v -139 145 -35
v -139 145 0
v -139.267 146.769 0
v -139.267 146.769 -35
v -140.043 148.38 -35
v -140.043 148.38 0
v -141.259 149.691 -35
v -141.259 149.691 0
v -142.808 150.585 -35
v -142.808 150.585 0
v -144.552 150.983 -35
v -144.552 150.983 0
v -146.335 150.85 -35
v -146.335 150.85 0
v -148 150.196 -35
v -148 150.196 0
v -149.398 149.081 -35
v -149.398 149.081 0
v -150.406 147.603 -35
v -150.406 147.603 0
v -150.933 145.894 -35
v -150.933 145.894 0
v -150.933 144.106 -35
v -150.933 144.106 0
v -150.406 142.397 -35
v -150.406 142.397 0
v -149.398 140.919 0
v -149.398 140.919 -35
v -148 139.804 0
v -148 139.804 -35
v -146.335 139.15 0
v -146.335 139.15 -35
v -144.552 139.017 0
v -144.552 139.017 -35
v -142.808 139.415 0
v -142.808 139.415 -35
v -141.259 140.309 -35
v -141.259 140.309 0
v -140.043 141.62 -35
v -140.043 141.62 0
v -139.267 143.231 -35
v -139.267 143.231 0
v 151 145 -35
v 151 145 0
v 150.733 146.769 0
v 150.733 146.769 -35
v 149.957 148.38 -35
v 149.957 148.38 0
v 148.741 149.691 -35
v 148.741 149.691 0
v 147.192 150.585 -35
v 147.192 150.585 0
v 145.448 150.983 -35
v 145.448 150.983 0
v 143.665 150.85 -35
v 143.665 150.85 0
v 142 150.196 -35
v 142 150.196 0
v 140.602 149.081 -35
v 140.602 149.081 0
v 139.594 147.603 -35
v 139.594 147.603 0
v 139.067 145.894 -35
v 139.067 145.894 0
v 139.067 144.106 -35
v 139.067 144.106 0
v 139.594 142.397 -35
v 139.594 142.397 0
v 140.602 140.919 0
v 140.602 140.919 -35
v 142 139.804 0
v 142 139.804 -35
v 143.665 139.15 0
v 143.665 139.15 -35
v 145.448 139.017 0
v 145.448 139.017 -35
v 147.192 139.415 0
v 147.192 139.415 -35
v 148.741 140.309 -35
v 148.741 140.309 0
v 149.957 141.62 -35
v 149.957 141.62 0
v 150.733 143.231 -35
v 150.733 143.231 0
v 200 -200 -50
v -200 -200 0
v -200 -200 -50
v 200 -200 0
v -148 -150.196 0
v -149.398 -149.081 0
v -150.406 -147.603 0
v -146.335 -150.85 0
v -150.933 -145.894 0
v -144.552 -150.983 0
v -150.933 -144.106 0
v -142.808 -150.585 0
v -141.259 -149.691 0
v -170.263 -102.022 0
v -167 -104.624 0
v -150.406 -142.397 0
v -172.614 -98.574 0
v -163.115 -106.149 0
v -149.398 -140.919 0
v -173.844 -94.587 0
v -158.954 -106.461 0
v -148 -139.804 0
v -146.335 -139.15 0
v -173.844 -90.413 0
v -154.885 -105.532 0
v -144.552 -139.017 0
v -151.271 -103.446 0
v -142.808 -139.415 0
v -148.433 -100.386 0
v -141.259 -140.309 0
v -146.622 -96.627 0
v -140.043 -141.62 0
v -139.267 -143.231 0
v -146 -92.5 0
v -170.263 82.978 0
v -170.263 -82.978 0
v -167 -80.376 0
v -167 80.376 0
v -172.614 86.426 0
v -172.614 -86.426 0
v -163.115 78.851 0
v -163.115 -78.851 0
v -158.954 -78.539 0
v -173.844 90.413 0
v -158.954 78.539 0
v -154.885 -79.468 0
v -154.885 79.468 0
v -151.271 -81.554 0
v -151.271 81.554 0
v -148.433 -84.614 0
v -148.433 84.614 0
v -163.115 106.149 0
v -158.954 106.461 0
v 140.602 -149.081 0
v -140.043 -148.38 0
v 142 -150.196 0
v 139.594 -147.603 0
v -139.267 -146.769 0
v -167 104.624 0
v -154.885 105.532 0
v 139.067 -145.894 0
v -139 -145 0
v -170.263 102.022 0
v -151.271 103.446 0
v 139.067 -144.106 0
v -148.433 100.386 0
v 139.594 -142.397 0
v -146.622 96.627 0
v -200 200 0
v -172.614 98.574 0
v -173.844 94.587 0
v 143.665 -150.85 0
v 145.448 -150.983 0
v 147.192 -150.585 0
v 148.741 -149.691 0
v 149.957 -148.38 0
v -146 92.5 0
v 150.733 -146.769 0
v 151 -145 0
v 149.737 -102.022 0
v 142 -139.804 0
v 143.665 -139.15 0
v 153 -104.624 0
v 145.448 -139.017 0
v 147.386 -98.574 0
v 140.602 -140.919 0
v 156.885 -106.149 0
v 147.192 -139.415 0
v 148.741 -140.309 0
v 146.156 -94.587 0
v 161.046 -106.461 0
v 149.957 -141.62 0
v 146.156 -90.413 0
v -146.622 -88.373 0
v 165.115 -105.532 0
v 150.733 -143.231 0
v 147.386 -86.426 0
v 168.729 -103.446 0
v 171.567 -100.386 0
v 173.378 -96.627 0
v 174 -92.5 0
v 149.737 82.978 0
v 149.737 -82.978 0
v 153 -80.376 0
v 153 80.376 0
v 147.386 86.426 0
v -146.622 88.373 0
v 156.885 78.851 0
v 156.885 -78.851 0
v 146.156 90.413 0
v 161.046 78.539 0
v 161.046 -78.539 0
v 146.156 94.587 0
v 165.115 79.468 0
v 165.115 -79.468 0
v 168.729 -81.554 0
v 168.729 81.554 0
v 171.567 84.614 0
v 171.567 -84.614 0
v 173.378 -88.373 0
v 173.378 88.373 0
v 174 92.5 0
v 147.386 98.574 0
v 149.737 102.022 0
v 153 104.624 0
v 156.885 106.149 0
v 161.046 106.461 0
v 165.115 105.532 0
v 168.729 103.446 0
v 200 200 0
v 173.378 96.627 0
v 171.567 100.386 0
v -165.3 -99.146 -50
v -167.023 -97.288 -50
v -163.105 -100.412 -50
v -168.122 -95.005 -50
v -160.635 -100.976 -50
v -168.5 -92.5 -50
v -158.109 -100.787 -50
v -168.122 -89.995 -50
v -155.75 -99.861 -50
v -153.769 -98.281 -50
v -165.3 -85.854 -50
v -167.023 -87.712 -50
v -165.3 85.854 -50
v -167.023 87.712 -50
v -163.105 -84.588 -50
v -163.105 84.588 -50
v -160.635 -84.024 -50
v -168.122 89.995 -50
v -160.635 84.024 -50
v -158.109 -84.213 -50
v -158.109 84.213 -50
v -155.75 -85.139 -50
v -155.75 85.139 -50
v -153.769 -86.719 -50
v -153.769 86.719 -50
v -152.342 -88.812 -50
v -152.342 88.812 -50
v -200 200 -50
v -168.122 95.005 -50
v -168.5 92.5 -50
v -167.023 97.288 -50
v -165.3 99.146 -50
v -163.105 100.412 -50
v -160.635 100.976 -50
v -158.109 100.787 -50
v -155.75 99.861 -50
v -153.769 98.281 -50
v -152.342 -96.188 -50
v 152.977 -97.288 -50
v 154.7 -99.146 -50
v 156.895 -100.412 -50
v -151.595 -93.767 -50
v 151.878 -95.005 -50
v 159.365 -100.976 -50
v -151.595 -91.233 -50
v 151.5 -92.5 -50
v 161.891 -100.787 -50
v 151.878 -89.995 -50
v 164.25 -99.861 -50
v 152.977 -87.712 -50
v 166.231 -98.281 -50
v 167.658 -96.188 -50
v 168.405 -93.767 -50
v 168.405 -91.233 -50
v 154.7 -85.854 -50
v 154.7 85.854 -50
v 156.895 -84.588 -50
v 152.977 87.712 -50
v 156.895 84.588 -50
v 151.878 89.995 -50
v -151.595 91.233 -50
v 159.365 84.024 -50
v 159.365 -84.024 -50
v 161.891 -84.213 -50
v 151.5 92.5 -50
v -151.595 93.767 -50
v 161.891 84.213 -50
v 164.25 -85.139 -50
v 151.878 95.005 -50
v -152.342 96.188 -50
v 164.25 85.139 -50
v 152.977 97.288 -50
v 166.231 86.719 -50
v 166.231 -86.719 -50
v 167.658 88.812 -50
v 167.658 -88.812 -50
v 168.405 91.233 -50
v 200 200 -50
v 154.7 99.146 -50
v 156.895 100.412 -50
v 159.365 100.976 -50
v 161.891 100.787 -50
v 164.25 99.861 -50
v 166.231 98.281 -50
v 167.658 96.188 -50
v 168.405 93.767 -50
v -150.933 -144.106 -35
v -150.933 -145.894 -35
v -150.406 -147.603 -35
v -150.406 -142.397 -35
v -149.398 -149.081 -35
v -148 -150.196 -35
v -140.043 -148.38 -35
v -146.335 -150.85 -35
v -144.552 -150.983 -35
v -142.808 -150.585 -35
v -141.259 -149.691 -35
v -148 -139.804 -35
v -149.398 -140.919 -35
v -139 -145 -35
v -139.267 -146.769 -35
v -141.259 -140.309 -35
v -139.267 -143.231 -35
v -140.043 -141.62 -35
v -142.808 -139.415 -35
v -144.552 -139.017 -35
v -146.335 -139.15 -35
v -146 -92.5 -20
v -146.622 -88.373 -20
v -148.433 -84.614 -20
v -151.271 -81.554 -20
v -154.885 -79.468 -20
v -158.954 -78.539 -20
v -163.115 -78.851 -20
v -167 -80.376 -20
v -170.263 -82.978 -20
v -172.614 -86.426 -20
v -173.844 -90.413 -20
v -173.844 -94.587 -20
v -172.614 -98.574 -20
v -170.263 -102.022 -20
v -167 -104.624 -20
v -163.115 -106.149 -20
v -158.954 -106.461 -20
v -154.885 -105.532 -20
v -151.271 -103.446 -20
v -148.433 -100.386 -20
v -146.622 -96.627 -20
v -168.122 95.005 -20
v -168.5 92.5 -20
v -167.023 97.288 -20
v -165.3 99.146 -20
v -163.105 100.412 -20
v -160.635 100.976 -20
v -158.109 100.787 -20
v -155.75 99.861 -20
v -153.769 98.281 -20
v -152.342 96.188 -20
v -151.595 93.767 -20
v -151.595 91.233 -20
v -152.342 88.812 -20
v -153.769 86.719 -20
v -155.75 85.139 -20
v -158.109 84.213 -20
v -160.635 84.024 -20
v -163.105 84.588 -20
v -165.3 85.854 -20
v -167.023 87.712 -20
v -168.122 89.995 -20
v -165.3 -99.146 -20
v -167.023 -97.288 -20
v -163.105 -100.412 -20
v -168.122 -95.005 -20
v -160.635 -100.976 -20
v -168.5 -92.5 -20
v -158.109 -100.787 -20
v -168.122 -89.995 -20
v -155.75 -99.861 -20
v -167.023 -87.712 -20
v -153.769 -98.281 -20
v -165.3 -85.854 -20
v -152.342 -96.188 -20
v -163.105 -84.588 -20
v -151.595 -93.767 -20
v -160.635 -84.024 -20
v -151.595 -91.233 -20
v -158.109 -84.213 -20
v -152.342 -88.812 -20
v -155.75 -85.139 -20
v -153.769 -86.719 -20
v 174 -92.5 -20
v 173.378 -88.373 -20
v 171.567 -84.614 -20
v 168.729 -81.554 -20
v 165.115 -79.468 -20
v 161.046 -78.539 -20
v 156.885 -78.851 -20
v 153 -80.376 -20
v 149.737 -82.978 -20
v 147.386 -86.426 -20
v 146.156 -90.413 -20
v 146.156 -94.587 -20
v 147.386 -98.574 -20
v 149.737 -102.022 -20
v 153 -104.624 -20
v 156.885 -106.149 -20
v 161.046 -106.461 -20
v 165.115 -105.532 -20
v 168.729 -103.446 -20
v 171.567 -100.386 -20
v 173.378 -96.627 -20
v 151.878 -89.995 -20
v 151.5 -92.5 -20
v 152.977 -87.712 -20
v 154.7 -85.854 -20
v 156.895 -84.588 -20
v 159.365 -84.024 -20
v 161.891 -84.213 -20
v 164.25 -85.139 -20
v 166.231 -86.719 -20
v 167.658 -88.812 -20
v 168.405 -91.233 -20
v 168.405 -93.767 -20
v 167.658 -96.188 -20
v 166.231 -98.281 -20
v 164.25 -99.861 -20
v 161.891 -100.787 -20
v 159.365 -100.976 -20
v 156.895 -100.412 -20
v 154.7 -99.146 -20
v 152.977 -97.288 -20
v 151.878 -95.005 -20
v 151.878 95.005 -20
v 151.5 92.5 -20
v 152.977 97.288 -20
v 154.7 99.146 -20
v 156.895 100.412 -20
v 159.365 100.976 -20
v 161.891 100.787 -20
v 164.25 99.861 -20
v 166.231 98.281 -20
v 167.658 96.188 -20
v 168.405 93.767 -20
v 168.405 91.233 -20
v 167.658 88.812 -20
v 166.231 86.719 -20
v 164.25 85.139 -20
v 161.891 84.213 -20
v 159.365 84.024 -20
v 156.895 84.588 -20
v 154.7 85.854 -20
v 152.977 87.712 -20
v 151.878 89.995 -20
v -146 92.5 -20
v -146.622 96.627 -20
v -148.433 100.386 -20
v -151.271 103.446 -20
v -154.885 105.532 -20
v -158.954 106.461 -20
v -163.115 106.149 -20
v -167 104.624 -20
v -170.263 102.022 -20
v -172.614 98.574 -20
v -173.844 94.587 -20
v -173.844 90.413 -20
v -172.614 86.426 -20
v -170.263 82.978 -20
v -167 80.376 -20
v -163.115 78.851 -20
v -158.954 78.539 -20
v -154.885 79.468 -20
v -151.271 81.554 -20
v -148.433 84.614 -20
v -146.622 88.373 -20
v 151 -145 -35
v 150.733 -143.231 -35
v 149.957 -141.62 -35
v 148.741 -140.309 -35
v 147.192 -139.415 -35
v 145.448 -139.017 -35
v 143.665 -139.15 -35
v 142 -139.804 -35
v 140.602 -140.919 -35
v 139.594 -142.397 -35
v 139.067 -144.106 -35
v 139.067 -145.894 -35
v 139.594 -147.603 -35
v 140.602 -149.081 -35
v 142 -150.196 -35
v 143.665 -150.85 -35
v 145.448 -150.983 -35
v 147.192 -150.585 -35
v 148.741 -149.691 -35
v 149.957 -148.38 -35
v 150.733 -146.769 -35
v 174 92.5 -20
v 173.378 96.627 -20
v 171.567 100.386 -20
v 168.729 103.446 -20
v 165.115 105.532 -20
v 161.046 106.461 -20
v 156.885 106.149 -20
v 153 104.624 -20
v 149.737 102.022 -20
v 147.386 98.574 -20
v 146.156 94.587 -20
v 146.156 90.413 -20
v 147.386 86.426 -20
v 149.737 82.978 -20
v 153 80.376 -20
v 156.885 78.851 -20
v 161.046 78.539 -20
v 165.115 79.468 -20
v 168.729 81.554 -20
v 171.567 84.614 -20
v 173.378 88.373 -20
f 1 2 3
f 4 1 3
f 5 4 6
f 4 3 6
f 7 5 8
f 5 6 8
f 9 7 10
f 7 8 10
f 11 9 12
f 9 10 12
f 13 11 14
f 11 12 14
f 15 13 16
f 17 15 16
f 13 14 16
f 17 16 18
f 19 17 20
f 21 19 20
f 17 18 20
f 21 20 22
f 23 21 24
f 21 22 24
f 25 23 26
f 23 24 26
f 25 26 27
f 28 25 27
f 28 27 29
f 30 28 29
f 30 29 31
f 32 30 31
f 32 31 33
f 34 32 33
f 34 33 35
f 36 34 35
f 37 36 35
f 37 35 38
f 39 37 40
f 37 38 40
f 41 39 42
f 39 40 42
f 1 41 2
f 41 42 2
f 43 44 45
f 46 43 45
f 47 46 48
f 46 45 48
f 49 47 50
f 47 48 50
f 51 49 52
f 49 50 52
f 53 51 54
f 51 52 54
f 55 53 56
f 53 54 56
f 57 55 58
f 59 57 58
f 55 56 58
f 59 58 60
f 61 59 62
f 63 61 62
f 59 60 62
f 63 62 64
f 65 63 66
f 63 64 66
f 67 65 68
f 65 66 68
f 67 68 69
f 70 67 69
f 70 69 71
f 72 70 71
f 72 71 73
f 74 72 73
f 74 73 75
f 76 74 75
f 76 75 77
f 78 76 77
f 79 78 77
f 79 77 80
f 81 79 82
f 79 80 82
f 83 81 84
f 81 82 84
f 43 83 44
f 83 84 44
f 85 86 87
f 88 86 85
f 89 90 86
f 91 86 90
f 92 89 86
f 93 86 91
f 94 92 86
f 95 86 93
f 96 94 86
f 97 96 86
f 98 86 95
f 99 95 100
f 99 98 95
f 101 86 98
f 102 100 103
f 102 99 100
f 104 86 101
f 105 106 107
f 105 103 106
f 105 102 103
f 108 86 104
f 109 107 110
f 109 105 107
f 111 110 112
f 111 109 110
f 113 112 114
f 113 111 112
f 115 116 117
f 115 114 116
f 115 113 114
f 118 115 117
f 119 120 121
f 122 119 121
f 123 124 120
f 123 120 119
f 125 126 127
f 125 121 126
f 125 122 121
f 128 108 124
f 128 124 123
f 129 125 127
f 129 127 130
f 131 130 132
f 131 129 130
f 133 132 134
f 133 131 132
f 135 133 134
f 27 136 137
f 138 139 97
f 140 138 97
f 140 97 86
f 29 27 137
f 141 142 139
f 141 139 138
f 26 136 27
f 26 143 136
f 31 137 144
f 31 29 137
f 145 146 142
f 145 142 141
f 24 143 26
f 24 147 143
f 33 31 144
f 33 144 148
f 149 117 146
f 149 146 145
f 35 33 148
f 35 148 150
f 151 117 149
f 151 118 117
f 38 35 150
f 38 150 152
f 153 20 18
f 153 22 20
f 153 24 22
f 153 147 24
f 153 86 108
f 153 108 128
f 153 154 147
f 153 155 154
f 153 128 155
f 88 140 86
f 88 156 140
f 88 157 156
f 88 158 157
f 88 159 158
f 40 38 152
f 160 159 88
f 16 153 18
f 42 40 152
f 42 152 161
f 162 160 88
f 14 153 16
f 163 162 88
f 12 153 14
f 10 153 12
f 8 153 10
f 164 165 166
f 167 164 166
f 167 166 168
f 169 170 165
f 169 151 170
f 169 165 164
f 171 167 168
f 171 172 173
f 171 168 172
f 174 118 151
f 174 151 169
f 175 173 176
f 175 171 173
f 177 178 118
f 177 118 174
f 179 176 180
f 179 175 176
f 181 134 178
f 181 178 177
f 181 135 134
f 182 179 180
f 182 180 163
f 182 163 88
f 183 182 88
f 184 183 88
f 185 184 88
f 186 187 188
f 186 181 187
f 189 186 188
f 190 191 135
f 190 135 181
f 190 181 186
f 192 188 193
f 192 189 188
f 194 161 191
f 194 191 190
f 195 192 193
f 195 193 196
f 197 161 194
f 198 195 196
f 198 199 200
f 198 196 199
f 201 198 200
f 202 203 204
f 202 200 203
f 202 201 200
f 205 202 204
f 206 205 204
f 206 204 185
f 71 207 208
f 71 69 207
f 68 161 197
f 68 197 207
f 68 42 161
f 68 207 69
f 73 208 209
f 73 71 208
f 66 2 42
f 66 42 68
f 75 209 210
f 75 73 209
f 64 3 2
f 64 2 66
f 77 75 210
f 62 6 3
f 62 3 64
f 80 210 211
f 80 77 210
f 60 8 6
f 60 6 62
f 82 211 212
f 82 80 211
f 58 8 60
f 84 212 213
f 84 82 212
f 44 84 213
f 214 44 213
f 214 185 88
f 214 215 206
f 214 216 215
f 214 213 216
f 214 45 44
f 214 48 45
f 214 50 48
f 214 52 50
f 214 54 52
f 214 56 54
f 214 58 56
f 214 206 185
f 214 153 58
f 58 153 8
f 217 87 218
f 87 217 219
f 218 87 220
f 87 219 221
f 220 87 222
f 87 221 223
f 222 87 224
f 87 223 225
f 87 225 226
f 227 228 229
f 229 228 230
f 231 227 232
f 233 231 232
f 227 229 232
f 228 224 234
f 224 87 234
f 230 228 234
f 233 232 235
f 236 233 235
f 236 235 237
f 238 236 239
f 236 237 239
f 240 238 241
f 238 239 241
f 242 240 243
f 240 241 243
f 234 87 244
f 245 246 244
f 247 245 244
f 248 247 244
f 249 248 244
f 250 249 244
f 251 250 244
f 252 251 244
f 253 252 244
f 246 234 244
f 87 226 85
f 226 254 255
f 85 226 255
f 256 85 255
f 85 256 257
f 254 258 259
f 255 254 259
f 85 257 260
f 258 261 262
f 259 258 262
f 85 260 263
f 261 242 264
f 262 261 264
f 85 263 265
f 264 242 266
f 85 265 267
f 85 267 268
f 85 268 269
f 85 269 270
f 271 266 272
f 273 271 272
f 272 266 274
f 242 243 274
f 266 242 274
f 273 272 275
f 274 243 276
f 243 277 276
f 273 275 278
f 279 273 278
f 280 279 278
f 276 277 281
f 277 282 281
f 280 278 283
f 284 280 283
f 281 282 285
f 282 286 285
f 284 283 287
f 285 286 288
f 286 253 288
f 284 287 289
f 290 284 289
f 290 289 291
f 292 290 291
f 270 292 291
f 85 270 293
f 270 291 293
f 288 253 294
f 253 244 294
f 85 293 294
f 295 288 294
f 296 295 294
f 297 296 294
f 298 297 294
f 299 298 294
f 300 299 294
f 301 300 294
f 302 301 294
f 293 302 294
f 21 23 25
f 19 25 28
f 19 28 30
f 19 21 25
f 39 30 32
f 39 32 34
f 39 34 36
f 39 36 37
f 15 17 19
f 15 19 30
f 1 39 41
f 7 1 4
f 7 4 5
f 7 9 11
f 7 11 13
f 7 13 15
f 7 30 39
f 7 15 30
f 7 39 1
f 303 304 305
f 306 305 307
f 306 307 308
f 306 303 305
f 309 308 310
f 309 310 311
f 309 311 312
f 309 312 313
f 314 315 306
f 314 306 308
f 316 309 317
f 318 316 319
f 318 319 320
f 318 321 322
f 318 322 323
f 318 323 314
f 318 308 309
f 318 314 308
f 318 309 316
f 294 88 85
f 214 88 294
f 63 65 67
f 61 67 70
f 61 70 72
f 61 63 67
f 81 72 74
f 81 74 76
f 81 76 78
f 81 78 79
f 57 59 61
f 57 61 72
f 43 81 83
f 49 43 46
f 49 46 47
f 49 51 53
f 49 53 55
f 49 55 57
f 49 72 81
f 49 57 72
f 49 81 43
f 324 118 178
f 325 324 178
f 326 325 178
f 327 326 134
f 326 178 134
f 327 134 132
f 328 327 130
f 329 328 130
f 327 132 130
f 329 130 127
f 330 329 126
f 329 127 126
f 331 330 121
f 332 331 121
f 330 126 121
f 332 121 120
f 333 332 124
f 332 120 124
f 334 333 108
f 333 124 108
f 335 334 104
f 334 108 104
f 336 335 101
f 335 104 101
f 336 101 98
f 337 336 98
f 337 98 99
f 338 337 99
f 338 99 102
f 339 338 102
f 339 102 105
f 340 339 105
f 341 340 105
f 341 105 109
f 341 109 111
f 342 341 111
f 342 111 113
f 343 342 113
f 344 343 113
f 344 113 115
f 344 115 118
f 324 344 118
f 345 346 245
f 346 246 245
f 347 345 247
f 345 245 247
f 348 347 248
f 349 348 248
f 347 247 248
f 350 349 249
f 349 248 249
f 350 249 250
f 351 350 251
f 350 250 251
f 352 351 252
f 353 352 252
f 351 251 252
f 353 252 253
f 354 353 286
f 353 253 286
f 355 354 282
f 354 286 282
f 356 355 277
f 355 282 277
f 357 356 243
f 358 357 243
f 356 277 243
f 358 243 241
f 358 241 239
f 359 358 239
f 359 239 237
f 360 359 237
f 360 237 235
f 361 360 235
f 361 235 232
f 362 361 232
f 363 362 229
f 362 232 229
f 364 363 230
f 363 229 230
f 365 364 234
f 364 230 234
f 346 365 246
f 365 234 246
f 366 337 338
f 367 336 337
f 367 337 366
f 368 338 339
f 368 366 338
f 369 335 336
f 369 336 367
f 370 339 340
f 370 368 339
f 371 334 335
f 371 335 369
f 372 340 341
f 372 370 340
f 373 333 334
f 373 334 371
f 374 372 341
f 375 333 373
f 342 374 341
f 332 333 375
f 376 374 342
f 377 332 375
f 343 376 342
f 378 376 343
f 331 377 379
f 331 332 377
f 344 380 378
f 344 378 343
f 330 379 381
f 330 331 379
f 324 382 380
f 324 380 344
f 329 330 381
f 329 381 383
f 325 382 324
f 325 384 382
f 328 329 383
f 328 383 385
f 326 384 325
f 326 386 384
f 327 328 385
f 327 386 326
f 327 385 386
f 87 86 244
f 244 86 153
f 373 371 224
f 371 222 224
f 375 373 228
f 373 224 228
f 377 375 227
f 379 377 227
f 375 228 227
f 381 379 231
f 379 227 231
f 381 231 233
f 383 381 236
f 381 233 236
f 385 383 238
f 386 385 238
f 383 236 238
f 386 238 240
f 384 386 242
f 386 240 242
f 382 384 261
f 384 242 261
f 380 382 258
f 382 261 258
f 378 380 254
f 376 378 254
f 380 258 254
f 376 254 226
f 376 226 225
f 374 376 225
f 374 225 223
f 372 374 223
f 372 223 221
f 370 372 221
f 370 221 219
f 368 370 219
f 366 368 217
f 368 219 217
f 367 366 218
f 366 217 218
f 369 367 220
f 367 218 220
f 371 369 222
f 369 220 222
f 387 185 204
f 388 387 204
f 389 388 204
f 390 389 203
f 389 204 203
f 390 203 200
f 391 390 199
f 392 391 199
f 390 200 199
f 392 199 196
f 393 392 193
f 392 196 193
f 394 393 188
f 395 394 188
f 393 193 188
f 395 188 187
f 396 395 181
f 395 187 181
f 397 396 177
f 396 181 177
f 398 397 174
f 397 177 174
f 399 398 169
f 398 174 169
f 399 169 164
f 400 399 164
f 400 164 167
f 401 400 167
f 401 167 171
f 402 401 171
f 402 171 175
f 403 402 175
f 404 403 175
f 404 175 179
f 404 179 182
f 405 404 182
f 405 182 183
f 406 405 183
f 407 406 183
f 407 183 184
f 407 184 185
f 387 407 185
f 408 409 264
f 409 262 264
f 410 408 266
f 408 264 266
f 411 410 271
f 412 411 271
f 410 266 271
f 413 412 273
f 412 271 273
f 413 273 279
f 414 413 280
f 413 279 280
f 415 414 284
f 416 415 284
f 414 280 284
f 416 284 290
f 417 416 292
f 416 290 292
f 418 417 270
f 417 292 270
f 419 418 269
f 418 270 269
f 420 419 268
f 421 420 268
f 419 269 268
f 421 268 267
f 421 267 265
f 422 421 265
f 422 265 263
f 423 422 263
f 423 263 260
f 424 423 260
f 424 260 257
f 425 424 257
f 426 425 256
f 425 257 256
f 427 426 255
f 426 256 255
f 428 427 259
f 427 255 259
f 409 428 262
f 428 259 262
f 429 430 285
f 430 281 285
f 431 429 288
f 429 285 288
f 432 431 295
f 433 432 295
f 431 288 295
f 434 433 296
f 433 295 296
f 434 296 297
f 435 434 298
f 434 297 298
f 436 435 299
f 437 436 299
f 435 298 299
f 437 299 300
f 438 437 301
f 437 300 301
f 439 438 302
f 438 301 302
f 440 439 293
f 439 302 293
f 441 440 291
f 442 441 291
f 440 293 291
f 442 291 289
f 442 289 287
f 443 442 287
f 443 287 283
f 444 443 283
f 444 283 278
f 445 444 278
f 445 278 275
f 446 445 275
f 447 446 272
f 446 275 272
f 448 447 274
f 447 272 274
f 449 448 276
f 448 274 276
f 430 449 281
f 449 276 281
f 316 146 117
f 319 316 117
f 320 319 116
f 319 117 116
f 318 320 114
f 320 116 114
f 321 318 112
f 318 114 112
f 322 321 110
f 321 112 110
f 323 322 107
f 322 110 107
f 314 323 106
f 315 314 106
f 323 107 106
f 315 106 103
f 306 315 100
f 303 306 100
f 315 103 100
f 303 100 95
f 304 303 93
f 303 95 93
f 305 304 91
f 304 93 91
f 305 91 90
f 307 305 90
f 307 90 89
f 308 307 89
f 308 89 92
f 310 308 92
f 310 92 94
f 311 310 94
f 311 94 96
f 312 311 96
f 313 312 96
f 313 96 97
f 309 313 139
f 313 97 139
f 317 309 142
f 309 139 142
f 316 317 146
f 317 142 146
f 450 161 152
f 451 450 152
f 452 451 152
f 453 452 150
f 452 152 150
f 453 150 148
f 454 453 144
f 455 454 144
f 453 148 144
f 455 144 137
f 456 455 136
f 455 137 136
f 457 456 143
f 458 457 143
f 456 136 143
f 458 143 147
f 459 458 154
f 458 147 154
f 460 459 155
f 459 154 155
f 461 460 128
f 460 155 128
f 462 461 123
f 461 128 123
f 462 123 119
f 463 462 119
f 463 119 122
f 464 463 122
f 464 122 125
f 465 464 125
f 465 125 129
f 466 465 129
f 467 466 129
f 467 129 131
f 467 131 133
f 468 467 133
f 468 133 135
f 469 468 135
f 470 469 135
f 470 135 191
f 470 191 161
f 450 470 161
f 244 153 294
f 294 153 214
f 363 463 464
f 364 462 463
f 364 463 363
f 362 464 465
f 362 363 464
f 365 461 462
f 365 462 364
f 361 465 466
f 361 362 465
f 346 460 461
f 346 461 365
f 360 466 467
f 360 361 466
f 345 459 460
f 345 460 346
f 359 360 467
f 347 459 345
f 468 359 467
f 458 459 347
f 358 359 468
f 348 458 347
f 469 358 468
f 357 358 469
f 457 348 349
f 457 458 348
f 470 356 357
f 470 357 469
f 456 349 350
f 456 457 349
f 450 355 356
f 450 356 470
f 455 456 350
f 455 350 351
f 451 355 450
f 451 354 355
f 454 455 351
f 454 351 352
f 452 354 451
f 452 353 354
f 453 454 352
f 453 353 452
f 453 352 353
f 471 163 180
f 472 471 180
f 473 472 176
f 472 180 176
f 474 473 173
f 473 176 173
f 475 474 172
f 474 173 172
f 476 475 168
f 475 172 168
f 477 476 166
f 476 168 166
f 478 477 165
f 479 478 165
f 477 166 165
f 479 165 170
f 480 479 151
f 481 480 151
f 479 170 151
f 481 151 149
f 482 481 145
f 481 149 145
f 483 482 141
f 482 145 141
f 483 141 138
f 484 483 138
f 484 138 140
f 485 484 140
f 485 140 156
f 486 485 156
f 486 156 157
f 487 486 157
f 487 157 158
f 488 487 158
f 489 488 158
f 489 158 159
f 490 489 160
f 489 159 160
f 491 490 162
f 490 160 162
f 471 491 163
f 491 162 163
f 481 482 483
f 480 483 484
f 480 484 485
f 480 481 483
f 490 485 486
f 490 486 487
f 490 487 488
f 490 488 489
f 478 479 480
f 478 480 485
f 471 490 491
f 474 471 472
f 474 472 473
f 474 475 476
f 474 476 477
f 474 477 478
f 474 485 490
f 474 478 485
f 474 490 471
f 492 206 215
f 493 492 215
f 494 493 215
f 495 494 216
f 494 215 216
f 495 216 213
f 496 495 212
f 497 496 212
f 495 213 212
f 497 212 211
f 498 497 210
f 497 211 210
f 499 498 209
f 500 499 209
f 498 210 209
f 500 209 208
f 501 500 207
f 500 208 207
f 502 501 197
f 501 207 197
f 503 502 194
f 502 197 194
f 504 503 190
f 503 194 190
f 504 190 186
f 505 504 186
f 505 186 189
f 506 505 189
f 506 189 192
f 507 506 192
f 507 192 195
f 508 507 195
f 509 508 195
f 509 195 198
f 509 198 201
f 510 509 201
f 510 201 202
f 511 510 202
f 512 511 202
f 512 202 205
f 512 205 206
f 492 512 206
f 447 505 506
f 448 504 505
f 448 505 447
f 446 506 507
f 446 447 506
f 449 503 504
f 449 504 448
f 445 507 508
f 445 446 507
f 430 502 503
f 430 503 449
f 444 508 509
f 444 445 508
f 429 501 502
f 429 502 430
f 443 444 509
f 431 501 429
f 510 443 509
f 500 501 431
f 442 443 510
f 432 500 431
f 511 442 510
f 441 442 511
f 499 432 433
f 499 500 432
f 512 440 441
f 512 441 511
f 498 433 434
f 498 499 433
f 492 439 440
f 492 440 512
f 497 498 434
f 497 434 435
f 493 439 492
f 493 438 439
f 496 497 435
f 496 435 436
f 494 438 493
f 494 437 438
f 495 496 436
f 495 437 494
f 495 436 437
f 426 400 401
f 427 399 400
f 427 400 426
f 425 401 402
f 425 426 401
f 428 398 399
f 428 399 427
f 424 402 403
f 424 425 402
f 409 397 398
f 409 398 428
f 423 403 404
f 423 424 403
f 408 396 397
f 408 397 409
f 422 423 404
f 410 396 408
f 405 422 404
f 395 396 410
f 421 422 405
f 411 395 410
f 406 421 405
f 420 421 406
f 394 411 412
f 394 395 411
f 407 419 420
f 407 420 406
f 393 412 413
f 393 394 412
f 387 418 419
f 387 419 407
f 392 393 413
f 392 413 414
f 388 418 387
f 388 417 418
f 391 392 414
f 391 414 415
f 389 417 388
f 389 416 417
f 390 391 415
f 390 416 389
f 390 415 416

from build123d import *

# Parameters (mm, degrees)
F0_W           = 400
F0_H           = 400
F1_DEPTH       = 50
F2_R           = 6
F3_DEPTH       = 35
F5_D           = 17
F5_DEPTH       = 53
F5_CBORE_D     = 28
F5_CBORE_DEPTH = 20


with BuildPart() as f1:
    # F0 (on Top) → F1 (new body)
    with BuildSketch(Plane.XY):
        Rectangle(F0_W, F0_H)
    extrude(amount=-F1_DEPTH)

    # F2 (on face) → F3 (cut)
    with BuildSketch(Plane.XY):
        with Locations((145, 145)):
            Circle(F2_R)
        with Locations((145, -145)):
            Circle(F2_R)
        with Locations((-145, 145)):
            Circle(F2_R)
        with Locations((-145, -145)):
            Circle(F2_R)
    extrude(amount=-F3_DEPTH, mode=Mode.SUBTRACT)

    # F5
    with Locations(Plane.XY):
        with Locations((160, 92.5), (160, -92.5), (-160, -92.5), (-160, 92.5)):
            CounterBoreHole(F5_D / 2, F5_CBORE_D / 2, F5_CBORE_DEPTH, depth=F5_DEPTH)


solid = f1.part
